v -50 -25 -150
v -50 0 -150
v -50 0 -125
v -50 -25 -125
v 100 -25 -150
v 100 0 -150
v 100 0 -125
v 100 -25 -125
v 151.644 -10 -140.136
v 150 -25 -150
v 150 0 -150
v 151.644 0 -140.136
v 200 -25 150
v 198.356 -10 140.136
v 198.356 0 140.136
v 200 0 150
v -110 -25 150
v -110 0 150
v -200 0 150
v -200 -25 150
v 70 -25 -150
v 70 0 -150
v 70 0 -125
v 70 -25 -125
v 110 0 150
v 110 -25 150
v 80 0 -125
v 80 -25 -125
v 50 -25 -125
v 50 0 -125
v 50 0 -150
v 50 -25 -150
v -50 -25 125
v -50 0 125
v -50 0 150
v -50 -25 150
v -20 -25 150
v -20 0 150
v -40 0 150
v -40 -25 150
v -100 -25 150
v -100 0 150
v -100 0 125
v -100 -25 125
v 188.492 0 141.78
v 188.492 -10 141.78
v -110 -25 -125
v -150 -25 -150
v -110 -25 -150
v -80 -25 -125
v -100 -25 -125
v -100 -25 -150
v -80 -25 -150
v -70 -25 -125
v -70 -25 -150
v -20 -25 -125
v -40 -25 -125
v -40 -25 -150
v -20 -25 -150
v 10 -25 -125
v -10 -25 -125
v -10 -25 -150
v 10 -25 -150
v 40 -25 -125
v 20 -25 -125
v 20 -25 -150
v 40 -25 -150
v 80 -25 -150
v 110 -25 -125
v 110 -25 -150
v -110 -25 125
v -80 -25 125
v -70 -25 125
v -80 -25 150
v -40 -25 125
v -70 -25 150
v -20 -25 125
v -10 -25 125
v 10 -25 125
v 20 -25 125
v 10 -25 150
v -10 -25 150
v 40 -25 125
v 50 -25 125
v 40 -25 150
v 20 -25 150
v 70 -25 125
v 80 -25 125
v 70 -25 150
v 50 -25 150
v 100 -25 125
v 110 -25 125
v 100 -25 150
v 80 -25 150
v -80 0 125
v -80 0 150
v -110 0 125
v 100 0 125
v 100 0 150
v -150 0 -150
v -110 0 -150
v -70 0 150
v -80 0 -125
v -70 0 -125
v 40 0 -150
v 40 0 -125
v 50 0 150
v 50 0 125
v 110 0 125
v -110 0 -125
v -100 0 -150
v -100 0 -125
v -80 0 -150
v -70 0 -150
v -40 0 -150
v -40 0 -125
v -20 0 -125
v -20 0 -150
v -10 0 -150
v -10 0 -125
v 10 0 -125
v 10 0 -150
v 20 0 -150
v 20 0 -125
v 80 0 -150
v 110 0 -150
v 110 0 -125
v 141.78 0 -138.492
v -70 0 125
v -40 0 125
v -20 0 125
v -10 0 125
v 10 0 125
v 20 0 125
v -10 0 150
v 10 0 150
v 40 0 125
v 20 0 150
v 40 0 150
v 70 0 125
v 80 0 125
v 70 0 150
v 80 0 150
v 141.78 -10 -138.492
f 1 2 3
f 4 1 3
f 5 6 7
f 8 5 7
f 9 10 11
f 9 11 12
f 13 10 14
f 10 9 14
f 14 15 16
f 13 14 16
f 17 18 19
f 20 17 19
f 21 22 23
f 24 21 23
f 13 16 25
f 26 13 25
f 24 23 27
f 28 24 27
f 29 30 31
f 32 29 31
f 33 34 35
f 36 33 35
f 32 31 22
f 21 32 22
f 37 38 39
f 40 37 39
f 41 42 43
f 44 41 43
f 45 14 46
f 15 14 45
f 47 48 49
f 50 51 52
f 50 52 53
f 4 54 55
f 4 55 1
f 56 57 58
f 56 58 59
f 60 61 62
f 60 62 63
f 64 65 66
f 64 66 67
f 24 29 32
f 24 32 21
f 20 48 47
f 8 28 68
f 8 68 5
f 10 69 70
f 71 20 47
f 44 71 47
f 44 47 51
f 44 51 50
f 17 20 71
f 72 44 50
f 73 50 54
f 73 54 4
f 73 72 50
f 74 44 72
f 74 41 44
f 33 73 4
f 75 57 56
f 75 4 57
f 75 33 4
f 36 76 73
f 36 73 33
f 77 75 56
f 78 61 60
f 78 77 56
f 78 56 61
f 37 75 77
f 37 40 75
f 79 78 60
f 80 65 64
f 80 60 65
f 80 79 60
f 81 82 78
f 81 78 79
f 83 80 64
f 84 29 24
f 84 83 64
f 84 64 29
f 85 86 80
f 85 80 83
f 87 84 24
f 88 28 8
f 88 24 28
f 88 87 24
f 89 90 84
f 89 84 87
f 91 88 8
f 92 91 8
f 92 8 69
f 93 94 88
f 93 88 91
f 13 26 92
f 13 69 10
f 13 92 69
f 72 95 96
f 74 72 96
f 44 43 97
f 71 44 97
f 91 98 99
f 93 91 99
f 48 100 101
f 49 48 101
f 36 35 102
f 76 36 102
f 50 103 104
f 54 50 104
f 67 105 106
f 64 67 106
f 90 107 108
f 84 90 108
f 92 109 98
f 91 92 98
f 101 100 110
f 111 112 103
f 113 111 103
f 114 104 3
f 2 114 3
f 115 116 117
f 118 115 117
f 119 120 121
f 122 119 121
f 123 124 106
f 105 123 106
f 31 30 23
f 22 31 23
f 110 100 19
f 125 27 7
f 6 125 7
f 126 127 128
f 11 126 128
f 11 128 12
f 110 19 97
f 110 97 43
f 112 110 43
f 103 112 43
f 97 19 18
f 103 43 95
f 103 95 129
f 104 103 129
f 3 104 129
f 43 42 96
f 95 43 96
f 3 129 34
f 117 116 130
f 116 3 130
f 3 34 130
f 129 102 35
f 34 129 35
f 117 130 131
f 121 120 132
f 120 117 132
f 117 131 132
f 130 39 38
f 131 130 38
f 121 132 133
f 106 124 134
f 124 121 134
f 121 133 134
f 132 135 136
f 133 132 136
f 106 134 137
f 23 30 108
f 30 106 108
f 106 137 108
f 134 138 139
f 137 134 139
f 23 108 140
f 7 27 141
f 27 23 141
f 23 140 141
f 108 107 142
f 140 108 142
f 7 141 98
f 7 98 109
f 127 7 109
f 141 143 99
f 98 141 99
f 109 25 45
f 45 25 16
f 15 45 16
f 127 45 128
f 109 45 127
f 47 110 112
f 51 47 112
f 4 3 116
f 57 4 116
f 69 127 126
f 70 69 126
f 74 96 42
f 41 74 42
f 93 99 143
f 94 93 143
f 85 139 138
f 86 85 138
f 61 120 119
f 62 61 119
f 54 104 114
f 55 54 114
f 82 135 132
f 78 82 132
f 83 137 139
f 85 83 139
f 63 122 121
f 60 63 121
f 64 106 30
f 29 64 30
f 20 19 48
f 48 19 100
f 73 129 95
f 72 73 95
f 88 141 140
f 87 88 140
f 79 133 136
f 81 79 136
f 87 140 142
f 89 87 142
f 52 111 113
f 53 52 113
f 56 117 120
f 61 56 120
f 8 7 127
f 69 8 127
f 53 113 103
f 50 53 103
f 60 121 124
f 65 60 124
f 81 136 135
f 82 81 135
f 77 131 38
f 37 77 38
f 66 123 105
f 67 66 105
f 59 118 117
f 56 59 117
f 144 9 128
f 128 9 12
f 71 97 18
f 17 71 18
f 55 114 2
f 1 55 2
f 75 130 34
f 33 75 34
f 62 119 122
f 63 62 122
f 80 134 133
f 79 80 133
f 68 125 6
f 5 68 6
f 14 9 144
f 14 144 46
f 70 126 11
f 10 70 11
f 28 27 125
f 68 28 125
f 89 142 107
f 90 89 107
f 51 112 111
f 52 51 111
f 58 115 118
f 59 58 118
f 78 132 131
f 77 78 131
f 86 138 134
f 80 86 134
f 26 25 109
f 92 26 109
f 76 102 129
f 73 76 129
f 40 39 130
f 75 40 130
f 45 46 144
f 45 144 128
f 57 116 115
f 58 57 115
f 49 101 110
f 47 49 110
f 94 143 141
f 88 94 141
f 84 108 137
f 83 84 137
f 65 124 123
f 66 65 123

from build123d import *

# Parameters (mm, degrees)
F1_DEPTH = 25
F2_W     = 10
F2_H     = 284.1381265149
F3_DEPTH = 10


with BuildPart() as f1:
    # F0 (on Front) → F1 (new body)
    with BuildSketch(Plane.XZ):
        Polygon((-175, 0), (175, 0), (200, 150), (110, 150), (110, 125), (100, 125), (100, 150), (80, 150), (80, 125), (70, 125), (70, 150), (50, 150), (50, 125), (40, 125), (40, 150), (20, 150), (20, 125), (10, 125), (10, 150), (-10, 150), (-10, 125), (-20, 125), (-20, 150), (-40, 150), (-40, 125), (-50, 125), (-50, 150), (-70, 150), (-70, 125), (-80, 125), (-80, 150), (-100, 150), (-100, 125), (-110, 125), (-110, 150), (-200, 150), align=None)
        Polygon((110, -150), (150, -150), (175, 0), (-175, 0), (-150, -150), (-110, -150), (-110, -125), (-100, -125), (-100, -150), (-80, -150), (-80, -125), (-70, -125), (-70, -150), (-50, -150), (-50, -125), (-40, -125), (-40, -150), (-20, -150), (-20, -125), (-10, -125), (-10, -150), (10, -150), (10, -125), (20, -125), (20, -150), (40, -150), (40, -125), (50, -125), (50, -150), (70, -150), (70, -125), (80, -125), (80, -150), (100, -150), (100, -125), (110, -125), align=None)
    extrude(amount=F1_DEPTH)

    # F2 (on face) → F3 (cut)
    with BuildSketch(Plane(origin=(170.2702702703, 0, -28.3783783784), x_dir=(0, 1, 0), z_dir=(0.9863939238, 0, -0.1643989873))):
        with Locations((-5, 28.7698227784)):
            Rectangle(F2_W, F2_H)
    extrude(amount=-F3_DEPTH, mode=Mode.SUBTRACT)


solid = f1.part
